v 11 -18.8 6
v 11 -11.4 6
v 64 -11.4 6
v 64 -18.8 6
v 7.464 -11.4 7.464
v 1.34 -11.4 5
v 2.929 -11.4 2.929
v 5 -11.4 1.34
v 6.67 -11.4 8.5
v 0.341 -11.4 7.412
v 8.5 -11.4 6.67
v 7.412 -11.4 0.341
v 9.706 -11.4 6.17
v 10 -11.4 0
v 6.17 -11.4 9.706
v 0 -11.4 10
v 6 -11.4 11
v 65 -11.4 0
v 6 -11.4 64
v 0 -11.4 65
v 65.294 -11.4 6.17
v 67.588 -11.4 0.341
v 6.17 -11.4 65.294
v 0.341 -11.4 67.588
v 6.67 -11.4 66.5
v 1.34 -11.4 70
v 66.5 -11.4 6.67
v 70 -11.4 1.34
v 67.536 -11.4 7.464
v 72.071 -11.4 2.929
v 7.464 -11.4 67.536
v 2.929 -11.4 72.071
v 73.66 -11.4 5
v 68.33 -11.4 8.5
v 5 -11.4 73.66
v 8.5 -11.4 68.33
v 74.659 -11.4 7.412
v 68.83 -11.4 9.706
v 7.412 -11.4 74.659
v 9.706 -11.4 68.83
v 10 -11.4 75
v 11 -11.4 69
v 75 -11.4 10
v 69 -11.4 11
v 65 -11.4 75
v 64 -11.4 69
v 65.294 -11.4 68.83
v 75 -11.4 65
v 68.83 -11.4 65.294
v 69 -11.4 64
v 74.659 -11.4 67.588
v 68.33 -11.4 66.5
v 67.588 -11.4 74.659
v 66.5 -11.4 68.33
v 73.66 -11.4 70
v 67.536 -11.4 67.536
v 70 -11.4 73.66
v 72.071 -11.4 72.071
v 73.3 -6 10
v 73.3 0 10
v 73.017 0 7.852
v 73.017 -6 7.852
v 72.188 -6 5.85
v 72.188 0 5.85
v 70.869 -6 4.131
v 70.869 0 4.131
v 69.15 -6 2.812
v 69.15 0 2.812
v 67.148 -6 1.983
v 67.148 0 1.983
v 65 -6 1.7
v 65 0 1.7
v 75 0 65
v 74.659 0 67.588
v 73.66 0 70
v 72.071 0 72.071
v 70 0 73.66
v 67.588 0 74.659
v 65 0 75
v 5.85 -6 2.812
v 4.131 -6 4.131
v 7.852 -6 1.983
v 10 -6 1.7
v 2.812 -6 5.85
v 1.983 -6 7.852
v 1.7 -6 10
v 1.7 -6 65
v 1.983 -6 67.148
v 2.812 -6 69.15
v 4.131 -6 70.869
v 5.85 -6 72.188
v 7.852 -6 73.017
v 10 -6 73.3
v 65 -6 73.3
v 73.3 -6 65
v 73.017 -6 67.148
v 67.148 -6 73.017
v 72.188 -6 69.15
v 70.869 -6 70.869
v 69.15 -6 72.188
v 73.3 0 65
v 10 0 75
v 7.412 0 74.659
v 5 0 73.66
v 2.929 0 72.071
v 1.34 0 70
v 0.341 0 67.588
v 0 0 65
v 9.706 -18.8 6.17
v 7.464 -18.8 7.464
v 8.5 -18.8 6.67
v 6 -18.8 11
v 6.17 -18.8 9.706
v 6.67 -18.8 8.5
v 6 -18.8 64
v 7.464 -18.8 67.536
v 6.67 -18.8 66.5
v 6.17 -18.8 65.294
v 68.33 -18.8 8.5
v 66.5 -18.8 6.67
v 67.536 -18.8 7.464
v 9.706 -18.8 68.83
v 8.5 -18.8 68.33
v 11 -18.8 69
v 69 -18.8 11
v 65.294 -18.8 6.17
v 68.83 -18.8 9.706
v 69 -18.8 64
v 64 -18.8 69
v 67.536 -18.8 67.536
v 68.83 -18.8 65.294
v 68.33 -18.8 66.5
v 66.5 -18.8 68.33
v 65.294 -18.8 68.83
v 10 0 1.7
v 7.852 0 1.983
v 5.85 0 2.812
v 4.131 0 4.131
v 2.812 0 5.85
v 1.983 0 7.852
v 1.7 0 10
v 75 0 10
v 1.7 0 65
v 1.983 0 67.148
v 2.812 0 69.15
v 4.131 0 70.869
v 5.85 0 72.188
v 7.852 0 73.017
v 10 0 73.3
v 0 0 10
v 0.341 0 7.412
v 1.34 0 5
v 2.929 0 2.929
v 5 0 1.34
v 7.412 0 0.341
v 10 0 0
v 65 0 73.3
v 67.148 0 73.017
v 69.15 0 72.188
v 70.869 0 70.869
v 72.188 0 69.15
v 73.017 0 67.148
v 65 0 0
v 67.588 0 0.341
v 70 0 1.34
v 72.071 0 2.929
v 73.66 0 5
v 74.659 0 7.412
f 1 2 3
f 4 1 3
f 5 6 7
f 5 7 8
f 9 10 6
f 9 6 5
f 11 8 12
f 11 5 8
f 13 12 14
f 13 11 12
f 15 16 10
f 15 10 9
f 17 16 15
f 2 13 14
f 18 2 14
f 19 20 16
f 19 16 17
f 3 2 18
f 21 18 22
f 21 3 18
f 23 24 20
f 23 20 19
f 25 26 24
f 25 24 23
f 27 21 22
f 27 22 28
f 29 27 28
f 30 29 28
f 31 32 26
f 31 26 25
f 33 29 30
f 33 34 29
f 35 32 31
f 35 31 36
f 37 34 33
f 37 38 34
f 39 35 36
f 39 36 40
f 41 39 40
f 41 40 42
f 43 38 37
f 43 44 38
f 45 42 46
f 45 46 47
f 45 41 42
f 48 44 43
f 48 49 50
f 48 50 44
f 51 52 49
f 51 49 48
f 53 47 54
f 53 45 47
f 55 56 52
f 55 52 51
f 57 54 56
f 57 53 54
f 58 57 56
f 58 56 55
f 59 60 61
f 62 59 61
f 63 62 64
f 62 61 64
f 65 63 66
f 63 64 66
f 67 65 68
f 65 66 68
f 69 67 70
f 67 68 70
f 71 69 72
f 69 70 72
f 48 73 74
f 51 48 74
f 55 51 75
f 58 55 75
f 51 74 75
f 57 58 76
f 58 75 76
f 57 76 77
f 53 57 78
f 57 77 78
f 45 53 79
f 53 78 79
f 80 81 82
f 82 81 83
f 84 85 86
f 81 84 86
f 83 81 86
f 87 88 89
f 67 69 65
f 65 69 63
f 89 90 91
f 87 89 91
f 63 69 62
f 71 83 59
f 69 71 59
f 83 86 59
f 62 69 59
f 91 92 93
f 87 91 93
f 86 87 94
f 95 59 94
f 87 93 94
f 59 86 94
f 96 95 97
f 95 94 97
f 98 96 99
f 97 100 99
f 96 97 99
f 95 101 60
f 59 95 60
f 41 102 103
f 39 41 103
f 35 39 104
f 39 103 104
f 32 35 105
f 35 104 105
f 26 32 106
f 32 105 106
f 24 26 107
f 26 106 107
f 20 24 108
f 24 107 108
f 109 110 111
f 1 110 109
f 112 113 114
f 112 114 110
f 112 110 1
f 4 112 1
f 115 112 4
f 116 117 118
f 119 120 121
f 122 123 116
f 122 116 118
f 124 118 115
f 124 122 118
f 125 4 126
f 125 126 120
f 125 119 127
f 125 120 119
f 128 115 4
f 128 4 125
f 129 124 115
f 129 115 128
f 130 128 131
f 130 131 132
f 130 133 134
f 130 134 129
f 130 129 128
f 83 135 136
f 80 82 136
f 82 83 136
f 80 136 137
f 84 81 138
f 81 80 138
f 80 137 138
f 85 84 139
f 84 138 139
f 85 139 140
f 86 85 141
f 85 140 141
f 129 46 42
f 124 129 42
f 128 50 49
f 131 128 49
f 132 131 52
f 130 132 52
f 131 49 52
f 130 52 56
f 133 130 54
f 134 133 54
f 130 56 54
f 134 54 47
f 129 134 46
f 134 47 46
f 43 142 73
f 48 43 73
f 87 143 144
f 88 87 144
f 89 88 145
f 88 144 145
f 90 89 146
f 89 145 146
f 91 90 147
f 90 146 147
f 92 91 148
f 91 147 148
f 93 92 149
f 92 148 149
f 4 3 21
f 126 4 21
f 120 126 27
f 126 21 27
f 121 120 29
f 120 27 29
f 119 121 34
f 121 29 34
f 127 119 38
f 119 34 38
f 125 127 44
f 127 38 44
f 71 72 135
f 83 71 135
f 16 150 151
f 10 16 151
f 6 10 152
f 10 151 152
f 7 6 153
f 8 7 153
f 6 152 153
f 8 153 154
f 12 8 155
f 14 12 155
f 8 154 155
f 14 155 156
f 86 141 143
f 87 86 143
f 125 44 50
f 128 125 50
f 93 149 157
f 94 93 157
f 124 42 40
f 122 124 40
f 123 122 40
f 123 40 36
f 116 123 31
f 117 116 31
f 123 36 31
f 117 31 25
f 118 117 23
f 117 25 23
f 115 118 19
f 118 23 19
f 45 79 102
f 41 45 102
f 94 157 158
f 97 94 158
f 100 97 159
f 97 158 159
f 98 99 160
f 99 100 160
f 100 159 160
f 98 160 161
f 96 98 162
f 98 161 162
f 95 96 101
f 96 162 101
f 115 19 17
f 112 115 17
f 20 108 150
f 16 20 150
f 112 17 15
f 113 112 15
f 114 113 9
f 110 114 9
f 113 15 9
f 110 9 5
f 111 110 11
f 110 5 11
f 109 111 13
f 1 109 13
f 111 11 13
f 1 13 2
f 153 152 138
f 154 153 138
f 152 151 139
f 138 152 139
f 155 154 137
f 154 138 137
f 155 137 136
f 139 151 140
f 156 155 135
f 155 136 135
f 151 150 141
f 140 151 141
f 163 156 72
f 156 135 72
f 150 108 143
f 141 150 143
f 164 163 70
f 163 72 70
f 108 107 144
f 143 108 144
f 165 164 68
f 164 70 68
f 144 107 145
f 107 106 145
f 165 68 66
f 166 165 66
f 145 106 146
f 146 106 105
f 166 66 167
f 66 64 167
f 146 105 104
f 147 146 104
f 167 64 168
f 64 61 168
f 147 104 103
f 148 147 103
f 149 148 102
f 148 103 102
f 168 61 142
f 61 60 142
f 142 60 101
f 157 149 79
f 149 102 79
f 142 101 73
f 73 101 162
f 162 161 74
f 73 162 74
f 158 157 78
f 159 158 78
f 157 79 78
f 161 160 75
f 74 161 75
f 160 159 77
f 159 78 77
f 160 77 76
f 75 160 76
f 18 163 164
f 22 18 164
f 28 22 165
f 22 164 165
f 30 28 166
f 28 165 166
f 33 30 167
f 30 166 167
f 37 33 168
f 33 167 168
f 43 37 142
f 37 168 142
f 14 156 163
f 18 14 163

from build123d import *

# Parameters (mm, degrees)
F1_DEPTH = 11.4
F3_DEPTH = 5.4
F5_DEPTH = 7.4


with BuildPart() as f1:
    # F0 (on Front) → F1 (new body)
    with BuildSketch(Plane.XZ):
        with BuildLine():
            ThreePointArc((0, 10), (2.9289321881, 2.9289321881), (10, 0))
            Line((10, 0), (65, 0))
            ThreePointArc((65, 0), (72.0710678119, 2.9289321881), (75, 10))
            Line((75, 10), (75, 65))
            ThreePointArc((75, 65), (72.0710678119, 72.0710678119), (65, 75))
            Line((65, 75), (10, 75))
            ThreePointArc((10, 75), (2.9289321881, 72.0710678119), (0, 65))
            Line((0, 65), (0, 10))
        make_face()
        with BuildLine():
            ThreePointArc((1.7, 65), (4.1310137162, 70.8689862838), (10, 73.3))
            Line((10, 73.3), (65, 73.3))
            ThreePointArc((65, 73.3), (70.8689862838, 70.8689862838), (73.3, 65))
            Line((73.3, 65), (73.3, 10))
            ThreePointArc((73.3, 10), (70.8689862838, 4.1310137162), (65, 1.7))
            Line((65, 1.7), (10, 1.7))
            ThreePointArc((10, 1.7), (4.1310137162, 4.1310137162), (1.7, 10))
            Line((1.7, 10), (1.7, 65))
        make_face(mode=Mode.SUBTRACT)
    extrude(amount=F1_DEPTH)

    # F2 (on face) → F3 (join)
    with BuildSketch(Plane.XZ.offset(11.4)):
        with BuildLine():
            ThreePointArc((10, 73.3), (4.1310137162, 70.8689862838), (1.7, 65))
            Line((1.7, 65), (1.7, 10))
            ThreePointArc((1.7, 10), (4.1310137162, 4.1310137162), (10, 1.7))
            Line((10, 1.7), (65, 1.7))
            ThreePointArc((65, 1.7), (70.8689862838, 4.1310137162), (73.3, 10))
            Line((73.3, 10), (73.3, 65))
            ThreePointArc((73.3, 65), (70.8689862838, 70.8689862838), (65, 73.3))
            Line((65, 73.3), (10, 73.3))
        make_face()
    extrude(amount=-F3_DEPTH)

    # F4 (on face) → F5 (join)
    with BuildSketch(Plane.XZ.offset(11.4)):
        with BuildLine():
            Line((64, 69), (11, 69))
            ThreePointArc((11, 69), (7.4644660941, 67.5355339059), (6, 64))
            Line((6, 64), (6, 11))
            ThreePointArc((6, 11), (7.4644660941, 7.4644660941), (11, 6))
            Line((11, 6), (64, 6))
            ThreePointArc((64, 6), (67.5355339059, 7.4644660941), (69, 11))
            Line((69, 11), (69, 64))
            ThreePointArc((69, 64), (67.5355339059, 67.5355339059), (64, 69))
        make_face()
    extrude(amount=F5_DEPTH)


solid = f1.part
